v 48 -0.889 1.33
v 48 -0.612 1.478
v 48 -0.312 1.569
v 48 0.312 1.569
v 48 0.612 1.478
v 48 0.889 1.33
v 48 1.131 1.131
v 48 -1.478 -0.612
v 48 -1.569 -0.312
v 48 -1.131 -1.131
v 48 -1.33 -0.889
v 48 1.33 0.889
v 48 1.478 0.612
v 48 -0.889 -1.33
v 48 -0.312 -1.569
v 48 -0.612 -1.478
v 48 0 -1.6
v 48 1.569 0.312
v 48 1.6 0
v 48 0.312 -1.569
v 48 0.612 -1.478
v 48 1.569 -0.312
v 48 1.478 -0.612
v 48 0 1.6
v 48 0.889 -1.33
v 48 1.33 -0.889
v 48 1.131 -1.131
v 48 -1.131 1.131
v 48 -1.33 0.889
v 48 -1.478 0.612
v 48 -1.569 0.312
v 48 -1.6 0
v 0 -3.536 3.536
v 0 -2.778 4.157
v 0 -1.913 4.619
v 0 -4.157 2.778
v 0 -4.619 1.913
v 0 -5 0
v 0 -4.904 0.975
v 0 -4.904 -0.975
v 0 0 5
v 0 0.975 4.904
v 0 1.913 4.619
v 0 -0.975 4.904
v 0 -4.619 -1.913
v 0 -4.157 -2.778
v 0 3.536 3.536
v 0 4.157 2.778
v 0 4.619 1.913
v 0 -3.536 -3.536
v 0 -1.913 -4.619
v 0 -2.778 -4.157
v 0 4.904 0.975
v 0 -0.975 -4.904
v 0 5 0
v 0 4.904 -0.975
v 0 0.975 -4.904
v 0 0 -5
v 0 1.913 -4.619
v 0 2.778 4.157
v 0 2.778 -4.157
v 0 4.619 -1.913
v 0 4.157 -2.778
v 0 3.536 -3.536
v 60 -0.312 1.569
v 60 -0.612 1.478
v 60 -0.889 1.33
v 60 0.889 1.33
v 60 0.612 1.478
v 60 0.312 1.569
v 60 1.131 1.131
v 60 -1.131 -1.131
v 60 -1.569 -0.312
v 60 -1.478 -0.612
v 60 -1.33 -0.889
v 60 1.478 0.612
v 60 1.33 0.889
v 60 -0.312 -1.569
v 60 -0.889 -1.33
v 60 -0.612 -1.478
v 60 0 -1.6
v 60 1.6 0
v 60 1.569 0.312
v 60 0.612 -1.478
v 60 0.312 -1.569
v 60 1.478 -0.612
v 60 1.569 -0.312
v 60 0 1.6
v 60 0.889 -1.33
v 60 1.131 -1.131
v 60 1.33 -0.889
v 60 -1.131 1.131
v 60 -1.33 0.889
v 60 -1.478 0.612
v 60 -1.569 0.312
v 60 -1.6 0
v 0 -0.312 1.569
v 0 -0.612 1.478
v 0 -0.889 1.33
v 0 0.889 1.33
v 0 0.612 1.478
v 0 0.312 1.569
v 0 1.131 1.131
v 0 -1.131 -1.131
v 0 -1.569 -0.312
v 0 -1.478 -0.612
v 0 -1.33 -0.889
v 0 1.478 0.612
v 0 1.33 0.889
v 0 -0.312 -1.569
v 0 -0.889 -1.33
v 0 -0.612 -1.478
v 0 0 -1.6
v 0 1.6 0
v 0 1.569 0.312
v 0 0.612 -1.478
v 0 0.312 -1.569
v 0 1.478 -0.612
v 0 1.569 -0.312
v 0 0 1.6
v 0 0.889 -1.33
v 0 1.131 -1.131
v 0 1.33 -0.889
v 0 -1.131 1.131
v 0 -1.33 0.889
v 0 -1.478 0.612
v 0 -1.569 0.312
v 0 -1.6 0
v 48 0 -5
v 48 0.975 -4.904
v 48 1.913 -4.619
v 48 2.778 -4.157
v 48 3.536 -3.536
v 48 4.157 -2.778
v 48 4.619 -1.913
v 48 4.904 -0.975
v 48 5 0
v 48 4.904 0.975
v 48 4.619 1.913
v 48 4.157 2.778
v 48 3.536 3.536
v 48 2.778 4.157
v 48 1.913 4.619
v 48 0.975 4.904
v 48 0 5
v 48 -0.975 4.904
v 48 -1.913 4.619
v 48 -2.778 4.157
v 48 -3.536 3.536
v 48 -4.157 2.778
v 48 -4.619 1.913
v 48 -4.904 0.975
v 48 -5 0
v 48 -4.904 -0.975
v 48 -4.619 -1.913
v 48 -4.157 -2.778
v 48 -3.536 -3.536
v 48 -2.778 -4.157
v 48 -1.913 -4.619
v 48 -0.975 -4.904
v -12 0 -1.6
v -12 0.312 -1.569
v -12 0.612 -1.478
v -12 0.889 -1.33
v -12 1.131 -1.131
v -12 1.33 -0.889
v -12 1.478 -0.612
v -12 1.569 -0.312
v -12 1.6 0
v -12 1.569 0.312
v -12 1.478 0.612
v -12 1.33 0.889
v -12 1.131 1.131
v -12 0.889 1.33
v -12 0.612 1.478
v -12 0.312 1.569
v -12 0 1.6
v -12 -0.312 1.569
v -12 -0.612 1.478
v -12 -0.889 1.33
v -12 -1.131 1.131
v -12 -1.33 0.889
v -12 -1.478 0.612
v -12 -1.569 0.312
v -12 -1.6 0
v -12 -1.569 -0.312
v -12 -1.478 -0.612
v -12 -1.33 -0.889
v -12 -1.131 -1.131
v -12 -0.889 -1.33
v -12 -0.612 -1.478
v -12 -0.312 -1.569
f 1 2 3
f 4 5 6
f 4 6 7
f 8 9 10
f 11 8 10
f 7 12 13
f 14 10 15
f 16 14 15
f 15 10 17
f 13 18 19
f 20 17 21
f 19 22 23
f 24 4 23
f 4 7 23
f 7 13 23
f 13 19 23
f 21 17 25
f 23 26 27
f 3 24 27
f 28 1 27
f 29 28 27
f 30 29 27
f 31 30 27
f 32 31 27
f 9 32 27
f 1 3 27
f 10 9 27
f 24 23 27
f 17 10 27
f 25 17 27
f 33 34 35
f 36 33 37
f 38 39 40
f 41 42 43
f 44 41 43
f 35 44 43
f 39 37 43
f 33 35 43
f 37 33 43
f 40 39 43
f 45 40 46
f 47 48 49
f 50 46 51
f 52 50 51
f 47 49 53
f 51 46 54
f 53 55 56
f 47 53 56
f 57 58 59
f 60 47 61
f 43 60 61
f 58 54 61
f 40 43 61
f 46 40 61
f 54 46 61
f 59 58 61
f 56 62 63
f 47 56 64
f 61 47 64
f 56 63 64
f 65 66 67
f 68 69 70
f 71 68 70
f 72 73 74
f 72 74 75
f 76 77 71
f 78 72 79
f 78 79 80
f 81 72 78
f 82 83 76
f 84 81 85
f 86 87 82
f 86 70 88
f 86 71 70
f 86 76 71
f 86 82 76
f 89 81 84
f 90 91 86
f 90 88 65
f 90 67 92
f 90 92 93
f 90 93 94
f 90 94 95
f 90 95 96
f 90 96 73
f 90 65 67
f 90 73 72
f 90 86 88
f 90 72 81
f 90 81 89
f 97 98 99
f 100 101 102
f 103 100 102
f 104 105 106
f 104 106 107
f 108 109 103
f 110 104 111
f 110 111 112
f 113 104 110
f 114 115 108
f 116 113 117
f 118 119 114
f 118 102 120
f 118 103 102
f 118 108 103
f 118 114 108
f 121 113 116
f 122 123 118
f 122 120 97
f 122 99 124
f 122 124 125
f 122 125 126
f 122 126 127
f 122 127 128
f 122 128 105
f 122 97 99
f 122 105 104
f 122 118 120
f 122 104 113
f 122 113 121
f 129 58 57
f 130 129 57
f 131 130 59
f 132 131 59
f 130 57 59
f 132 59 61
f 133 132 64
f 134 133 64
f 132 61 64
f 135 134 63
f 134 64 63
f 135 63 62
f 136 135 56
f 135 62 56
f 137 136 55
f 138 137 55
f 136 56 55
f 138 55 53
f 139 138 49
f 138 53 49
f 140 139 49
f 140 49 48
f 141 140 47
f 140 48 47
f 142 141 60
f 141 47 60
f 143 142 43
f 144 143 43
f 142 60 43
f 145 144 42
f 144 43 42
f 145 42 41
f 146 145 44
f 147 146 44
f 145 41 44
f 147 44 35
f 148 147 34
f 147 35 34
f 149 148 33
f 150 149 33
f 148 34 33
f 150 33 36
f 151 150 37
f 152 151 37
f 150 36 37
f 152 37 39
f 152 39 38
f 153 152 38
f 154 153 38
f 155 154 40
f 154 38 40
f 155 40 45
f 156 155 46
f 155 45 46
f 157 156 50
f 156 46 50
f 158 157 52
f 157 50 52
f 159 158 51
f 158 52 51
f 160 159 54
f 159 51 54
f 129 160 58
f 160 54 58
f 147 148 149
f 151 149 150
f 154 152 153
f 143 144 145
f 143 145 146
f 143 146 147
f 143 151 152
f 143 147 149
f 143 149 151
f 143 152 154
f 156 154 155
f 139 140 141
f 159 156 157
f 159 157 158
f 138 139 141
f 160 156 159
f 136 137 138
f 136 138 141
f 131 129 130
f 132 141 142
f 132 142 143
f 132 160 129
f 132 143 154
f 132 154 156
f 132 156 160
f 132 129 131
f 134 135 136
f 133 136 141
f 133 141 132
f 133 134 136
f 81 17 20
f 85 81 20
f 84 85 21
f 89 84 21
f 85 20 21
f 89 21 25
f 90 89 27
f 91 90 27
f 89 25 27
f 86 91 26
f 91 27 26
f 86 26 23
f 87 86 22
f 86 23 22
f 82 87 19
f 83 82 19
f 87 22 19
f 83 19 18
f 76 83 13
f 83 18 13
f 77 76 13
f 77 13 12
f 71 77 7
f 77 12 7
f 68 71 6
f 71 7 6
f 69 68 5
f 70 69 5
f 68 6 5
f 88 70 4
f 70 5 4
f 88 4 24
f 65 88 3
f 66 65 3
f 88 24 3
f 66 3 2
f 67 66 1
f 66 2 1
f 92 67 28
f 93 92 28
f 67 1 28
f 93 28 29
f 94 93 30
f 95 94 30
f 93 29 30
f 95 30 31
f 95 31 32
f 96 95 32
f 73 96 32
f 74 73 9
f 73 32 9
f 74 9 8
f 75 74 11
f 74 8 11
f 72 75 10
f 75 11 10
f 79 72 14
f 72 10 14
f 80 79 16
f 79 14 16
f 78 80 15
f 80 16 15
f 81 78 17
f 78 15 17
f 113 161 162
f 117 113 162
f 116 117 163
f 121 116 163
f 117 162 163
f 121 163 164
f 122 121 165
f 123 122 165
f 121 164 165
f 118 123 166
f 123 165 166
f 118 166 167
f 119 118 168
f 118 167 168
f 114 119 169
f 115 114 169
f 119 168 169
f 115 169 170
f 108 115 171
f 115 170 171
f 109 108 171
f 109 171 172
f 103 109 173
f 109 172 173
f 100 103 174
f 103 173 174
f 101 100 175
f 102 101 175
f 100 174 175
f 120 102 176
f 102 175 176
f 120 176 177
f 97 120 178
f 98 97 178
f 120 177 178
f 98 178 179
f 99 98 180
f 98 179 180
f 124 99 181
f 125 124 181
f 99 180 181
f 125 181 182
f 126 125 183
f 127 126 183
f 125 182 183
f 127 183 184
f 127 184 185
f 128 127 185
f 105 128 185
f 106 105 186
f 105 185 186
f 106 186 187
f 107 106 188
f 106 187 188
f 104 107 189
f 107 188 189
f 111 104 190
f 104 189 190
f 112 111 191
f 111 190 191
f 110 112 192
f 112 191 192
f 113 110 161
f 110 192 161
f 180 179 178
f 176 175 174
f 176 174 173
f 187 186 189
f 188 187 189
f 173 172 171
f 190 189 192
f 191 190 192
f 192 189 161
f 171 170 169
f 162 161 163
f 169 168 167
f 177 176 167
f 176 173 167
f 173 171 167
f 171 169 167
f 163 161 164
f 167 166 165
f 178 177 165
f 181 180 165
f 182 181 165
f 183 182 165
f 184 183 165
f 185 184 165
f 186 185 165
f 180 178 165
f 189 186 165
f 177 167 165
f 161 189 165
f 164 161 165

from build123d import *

# Parameters (mm, degrees)
SK_FUSE_HOLDER_BODY_R  = 5
FUSE_HOLDER_BODY_DEPTH = 48
LEAD_START             = -12
SK_LEAD_IN_R           = 1.6
LEAD_IN_DEPTH          = 12
LEAD_START_2           = 48
SK_LEAD_OUT_R          = 1.6
LEAD_OUT_DEPTH         = 12


with BuildPart() as part:
    # SK Fuse holder body → Fuse holder body (new body)
    with BuildSketch(Plane(origin=(0, 0, 0), x_dir=(0, 0, -1), z_dir=(1, 0, 0))):
        Circle(SK_FUSE_HOLDER_BODY_R)
    extrude(amount=FUSE_HOLDER_BODY_DEPTH)


with BuildPart() as body_2:
    # SK Lead in → Lead in (new body)
    with BuildSketch(Plane(origin=(0, 0, 0), x_dir=(0, 0, -1), z_dir=(1, 0, 0)).offset(LEAD_START)):
        Circle(SK_LEAD_IN_R)
    extrude(amount=LEAD_IN_DEPTH)


with BuildPart() as body_3:
    # SK Lead out → Lead out (new body)
    with BuildSketch(Plane(origin=(0, 0, 0), x_dir=(0, 0, -1), z_dir=(1, 0, 0)).offset(LEAD_START_2)):
        Circle(SK_LEAD_OUT_R)
    extrude(amount=LEAD_OUT_DEPTH)


solid = Compound([part.part, body_2.part, body_3.part])
